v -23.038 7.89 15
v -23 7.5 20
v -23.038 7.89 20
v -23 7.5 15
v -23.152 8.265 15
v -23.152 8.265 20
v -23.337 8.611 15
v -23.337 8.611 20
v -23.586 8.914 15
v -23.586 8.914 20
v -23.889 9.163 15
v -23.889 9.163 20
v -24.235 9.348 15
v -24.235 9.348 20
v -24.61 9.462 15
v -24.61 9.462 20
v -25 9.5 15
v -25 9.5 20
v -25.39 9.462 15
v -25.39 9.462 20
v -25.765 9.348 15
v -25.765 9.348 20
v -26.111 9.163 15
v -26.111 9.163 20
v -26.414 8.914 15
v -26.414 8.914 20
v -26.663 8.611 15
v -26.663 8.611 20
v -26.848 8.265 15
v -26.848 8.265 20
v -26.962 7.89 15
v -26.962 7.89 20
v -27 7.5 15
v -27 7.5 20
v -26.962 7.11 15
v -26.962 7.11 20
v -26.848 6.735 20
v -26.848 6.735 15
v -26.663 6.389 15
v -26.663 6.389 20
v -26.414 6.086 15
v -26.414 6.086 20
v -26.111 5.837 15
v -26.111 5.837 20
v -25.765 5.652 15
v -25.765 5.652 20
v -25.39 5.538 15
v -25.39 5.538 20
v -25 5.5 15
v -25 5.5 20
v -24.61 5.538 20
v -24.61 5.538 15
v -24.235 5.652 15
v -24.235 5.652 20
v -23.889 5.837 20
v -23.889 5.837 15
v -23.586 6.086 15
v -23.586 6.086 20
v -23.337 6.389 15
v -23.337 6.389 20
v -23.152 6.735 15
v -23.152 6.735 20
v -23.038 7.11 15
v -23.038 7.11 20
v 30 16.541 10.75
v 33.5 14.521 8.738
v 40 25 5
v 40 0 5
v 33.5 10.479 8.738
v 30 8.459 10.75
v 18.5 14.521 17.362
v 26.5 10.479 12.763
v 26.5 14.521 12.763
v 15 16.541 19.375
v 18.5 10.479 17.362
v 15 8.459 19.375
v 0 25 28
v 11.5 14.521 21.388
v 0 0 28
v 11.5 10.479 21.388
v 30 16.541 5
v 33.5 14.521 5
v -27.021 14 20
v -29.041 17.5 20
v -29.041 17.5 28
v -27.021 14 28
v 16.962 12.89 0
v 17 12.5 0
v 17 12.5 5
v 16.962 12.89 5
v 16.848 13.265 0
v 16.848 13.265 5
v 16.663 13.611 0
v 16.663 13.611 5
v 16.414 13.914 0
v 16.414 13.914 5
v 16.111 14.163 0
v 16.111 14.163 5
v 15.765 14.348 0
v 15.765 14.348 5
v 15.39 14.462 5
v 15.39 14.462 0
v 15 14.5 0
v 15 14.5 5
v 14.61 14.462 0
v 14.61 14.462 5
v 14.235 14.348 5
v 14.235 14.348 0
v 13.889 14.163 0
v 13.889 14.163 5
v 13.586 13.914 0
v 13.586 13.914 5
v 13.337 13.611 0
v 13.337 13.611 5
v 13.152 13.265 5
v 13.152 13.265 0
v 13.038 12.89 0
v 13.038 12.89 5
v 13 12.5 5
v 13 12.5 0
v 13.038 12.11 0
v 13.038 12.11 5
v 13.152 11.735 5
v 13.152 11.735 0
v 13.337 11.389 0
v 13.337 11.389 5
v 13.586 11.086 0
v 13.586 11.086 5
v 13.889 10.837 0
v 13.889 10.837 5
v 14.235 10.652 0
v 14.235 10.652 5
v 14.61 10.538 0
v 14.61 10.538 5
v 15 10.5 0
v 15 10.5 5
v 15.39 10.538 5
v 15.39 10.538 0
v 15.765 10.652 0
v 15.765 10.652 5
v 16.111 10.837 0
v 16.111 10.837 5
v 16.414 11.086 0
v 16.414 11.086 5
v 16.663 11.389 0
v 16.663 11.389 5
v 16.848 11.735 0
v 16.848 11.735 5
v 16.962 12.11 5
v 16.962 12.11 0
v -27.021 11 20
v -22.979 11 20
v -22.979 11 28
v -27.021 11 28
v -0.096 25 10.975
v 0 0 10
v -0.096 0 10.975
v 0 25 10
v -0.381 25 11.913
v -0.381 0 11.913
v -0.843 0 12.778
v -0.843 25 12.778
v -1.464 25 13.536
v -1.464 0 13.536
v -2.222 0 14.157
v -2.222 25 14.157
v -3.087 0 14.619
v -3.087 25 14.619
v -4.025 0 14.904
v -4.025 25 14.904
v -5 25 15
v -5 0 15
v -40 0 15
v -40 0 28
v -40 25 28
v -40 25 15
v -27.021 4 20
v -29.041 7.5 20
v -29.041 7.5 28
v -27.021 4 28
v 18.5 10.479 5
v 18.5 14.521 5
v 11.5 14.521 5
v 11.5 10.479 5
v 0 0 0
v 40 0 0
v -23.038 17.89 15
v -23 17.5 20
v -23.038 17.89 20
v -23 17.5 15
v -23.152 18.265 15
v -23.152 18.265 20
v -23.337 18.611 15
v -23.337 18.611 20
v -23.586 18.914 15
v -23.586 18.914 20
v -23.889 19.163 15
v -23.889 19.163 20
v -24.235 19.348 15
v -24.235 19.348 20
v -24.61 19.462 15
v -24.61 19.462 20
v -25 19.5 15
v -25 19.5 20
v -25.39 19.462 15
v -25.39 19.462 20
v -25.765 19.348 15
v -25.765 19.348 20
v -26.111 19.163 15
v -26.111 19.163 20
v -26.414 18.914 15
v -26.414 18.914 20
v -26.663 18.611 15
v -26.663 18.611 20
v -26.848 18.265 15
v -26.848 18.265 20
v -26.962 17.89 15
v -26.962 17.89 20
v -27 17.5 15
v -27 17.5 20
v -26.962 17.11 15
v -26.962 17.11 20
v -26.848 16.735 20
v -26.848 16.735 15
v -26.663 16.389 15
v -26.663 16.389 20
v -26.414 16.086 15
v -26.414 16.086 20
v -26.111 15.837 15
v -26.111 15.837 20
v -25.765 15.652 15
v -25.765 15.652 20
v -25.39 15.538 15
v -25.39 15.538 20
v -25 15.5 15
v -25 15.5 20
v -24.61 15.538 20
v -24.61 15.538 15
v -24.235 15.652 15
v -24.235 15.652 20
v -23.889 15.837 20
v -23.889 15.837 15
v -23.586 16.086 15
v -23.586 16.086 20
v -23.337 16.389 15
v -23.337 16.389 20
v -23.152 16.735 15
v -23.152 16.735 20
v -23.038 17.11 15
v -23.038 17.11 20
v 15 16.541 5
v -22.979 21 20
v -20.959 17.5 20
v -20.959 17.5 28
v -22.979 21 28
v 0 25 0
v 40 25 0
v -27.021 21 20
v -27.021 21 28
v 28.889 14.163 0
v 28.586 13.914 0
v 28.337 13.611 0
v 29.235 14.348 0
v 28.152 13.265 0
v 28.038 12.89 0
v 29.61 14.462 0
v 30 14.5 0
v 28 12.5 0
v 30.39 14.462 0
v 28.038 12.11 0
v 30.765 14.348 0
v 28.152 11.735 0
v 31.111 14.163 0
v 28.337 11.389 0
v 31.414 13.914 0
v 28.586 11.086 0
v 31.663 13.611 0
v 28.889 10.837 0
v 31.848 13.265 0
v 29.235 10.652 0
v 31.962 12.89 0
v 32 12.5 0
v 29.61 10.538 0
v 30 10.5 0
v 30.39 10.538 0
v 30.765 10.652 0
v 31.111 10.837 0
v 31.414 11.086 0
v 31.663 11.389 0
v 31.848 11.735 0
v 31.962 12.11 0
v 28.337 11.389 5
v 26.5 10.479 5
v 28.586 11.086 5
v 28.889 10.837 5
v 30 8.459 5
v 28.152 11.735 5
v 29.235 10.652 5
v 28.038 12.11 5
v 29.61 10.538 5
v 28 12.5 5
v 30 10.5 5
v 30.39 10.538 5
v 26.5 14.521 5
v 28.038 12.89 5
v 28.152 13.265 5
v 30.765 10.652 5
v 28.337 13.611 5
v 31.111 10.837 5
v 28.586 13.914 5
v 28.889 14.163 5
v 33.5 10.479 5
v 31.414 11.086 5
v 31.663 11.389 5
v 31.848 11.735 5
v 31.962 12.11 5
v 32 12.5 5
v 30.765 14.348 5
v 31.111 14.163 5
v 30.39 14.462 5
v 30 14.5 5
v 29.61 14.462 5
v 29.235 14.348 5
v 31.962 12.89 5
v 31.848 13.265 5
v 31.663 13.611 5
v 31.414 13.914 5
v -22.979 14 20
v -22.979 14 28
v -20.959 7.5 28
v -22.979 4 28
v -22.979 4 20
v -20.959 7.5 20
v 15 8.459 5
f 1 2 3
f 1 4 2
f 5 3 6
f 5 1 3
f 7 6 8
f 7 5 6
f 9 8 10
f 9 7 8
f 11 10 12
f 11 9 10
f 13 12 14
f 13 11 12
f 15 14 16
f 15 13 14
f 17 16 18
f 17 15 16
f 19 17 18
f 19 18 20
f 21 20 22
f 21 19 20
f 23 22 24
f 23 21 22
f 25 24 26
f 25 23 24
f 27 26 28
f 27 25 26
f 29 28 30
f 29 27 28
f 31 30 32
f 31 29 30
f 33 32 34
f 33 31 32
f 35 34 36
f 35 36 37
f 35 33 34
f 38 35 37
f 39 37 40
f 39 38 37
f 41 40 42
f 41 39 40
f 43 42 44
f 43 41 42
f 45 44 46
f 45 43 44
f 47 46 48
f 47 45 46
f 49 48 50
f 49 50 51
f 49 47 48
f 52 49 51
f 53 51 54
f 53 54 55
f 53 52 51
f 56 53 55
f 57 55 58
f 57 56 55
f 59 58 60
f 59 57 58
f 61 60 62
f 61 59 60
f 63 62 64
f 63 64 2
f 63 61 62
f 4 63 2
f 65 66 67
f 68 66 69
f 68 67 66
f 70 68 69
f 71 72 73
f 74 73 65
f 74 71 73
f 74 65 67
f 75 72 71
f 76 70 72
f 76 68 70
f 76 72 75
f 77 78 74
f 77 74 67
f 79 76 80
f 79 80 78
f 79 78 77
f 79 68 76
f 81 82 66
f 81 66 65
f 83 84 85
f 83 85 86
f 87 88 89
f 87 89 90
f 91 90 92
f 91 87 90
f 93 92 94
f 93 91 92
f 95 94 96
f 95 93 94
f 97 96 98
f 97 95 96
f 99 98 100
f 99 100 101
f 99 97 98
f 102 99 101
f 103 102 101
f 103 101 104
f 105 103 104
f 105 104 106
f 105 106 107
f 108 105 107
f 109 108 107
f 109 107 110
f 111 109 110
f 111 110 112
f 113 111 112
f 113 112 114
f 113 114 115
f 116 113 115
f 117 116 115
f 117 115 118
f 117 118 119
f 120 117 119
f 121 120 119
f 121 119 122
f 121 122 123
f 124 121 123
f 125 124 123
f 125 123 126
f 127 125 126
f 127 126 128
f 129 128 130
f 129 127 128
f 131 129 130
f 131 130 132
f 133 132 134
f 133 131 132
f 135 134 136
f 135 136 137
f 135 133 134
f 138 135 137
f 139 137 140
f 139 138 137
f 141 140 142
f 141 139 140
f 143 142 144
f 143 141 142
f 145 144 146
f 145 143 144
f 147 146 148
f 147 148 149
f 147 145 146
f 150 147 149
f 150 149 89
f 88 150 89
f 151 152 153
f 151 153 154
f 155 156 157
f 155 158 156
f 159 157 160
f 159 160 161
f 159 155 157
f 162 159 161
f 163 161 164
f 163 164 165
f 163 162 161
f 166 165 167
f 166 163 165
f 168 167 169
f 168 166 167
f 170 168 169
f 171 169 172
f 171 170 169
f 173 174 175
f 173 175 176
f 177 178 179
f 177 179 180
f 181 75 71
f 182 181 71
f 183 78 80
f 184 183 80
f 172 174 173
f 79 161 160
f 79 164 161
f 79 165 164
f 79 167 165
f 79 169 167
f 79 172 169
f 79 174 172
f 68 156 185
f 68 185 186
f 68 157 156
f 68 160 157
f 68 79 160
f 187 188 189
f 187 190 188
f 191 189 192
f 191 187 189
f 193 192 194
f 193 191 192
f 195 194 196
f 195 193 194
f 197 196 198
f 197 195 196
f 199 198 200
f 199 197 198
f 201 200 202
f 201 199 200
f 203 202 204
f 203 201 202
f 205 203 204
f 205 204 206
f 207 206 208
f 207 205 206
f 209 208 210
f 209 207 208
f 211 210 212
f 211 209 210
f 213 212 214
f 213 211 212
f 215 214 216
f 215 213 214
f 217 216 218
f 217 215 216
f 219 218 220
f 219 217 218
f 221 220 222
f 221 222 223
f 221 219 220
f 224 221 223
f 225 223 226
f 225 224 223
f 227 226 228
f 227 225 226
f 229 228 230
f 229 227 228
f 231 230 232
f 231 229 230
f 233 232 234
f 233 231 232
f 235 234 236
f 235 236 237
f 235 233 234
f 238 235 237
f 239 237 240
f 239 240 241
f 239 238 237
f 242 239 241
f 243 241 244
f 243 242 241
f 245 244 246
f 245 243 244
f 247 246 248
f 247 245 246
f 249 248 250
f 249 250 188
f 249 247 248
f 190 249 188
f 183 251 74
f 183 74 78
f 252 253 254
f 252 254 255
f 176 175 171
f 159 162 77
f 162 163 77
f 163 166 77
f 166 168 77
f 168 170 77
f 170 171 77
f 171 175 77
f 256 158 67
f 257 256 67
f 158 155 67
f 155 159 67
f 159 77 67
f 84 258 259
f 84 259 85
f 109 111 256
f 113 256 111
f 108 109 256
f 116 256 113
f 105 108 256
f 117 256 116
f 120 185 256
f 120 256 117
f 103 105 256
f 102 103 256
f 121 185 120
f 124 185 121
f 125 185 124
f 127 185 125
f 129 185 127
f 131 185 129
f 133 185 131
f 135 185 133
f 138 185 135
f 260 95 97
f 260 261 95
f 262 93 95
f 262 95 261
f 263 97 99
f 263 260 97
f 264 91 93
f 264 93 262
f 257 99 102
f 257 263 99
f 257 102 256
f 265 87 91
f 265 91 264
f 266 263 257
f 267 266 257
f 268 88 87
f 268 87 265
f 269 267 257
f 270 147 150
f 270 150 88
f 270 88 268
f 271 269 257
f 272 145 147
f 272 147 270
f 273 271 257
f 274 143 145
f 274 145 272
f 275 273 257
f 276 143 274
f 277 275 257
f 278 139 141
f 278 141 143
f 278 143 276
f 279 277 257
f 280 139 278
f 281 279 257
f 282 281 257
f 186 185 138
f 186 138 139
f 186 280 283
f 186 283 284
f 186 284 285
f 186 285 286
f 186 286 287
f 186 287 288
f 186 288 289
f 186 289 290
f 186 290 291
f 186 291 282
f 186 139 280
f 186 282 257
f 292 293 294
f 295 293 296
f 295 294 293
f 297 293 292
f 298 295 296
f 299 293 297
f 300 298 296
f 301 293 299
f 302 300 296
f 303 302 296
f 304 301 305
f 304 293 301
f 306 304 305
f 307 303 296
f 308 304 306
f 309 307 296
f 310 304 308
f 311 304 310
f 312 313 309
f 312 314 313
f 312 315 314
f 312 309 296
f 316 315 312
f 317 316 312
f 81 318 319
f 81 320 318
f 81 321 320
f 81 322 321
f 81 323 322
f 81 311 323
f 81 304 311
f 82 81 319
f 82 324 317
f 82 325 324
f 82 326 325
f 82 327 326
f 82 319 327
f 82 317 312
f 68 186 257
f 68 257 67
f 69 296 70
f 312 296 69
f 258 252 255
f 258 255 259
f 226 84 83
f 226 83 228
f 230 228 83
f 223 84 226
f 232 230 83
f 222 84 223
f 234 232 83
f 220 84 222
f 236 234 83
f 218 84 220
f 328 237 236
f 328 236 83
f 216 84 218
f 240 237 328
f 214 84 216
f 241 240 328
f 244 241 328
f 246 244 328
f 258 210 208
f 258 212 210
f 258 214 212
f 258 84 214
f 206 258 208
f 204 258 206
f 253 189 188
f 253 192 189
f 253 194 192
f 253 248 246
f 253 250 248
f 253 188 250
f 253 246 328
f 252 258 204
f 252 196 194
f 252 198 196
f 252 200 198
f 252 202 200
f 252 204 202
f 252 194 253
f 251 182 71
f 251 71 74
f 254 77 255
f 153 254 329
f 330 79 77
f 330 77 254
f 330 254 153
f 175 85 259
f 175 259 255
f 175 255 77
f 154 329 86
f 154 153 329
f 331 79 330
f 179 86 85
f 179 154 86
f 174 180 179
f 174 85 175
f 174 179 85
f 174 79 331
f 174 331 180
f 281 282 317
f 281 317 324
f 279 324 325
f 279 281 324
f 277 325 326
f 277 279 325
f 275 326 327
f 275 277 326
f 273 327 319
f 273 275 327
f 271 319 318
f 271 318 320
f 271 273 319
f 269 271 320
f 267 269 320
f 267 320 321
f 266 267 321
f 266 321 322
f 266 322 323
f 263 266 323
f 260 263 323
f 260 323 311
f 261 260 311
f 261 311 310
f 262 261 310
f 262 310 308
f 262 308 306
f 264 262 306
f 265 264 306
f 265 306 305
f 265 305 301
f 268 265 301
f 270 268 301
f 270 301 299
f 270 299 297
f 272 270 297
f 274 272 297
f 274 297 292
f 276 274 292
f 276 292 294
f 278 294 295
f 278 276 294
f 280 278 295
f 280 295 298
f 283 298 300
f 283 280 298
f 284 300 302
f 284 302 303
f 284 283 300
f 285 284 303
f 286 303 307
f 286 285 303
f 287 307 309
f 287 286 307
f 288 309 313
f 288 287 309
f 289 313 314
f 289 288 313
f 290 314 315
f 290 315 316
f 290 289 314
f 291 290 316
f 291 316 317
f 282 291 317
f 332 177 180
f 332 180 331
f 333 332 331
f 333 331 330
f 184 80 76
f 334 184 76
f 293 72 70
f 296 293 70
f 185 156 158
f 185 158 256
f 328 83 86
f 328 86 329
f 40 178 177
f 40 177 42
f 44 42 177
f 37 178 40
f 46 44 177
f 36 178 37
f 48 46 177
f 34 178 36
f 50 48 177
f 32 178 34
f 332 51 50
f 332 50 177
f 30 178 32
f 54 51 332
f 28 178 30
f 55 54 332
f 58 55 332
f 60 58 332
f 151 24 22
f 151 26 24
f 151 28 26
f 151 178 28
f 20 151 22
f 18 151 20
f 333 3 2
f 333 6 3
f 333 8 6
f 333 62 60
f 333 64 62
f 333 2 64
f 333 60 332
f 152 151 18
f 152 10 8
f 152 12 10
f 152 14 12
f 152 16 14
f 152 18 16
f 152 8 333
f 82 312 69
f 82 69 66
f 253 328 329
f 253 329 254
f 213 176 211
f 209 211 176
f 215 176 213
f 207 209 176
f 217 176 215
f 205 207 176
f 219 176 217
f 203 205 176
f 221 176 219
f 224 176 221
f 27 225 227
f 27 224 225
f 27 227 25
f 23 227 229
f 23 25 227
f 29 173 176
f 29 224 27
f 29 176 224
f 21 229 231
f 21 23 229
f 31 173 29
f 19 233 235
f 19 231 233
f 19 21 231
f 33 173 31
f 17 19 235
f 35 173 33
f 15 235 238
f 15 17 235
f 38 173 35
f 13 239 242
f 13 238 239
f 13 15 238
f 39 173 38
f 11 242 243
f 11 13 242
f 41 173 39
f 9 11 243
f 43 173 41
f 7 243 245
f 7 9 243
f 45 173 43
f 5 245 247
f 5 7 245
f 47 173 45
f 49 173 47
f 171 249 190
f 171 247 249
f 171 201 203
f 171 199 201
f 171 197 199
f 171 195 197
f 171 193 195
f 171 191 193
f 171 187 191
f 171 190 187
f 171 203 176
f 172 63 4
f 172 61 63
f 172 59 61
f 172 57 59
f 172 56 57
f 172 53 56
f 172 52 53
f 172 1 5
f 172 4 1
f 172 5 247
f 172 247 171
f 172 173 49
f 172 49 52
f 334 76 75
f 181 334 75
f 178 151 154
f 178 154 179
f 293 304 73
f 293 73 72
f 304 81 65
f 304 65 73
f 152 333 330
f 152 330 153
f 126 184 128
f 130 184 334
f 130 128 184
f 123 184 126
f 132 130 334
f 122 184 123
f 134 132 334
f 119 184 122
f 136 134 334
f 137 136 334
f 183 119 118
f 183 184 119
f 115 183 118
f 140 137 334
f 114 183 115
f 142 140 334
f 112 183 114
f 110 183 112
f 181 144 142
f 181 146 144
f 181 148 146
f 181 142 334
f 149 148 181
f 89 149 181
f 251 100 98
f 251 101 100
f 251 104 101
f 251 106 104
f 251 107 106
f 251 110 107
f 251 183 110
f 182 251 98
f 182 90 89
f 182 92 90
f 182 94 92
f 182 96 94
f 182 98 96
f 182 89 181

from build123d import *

# Parameters (mm, degrees)
F1_DEPTH      = 25
F2_R          = 2
F3_DEPTH      = 25
F3_DEPTH_BACK = 25
F4_START      = 5
F4_DEPTH      = 20
F6_START      = 20
F5_R          = 2
F6_DEPTH      = 20
F7_DEPTH      = 40
F8_R          = 5


with BuildPart() as f1:
    # F0 (on Front) → F1 (new body)
    with BuildSketch(Plane.XZ):
        Polygon((0, 15), (0, 0), (40, 0), (40, 5), (0, 28), (-40, 28), (-40, 15), align=None)
    extrude(amount=-F1_DEPTH)

    # F2 (on Top) → F3 (cut, two sides)
    with BuildSketch(Plane.XY) as f3_sk:
        with Locations((30, 12.5)):
            Circle(F2_R)
        with Locations((15, 12.5)):
            Circle(F2_R)
    extrude(amount=F3_DEPTH, mode=Mode.SUBTRACT)
    extrude(f3_sk.sketch, amount=-F3_DEPTH_BACK, mode=Mode.SUBTRACT)

    # F2 (on Top) → F4 (cut)
    with BuildSketch(Plane.XY.offset(F4_START)):
        Polygon((11.5, 14.5207259422), (11.5, 10.4792740578), (15, 8.4585481157), (18.5, 10.4792740578), (18.5, 14.5207259422), (15, 16.5414518843), align=None)
        with Locations((15, 12.5)):
            Circle(F2_R, mode=Mode.SUBTRACT)
        Polygon((26.5, 14.5207259422), (26.5, 10.4792740578), (30, 8.4585481157), (33.5, 10.4792740578), (33.5, 14.5207259422), (30, 16.5414518843), align=None)
        with Locations((30, 12.5)):
            Circle(F2_R, mode=Mode.SUBTRACT)
    extrude(amount=F4_DEPTH, mode=Mode.SUBTRACT)

    # F5 (on Top) → F6 (cut)
    with BuildSketch(Plane.XY.offset(F6_START)):
        Polygon((-22.9792740578, 21), (-27.0207259422, 21), (-29.0414518843, 17.5), (-27.0207259422, 14), (-22.9792740578, 14), (-20.9585481157, 17.5), align=None)
        with Locations((-25, 17.5)):
            Circle(F5_R, mode=Mode.SUBTRACT)
        Polygon((-22.9792740578, 11), (-27.0207259422, 11), (-29.0414518843, 7.5), (-27.0207259422, 4), (-22.9792740578, 4), (-20.9585481157, 7.5), align=None)
        with Locations((-25, 7.5)):
            Circle(F5_R, mode=Mode.SUBTRACT)
    extrude(amount=F6_DEPTH, mode=Mode.SUBTRACT)

    # F5 (on Top) → F7 (cut)
    with BuildSketch(Plane.XY):
        with Locations((-25, 7.5)):
            Circle(F5_R)
        with Locations((-25, 17.5)):
            Circle(F5_R)
    extrude(amount=F7_DEPTH, mode=Mode.SUBTRACT)

    # F8
    f8_edges = [f1.edges().sort_by_distance(p)[0] for p in [
        (0, 12.5, 15),
    ]]
    fillet(f8_edges, radius=F8_R)


solid = f1.part
